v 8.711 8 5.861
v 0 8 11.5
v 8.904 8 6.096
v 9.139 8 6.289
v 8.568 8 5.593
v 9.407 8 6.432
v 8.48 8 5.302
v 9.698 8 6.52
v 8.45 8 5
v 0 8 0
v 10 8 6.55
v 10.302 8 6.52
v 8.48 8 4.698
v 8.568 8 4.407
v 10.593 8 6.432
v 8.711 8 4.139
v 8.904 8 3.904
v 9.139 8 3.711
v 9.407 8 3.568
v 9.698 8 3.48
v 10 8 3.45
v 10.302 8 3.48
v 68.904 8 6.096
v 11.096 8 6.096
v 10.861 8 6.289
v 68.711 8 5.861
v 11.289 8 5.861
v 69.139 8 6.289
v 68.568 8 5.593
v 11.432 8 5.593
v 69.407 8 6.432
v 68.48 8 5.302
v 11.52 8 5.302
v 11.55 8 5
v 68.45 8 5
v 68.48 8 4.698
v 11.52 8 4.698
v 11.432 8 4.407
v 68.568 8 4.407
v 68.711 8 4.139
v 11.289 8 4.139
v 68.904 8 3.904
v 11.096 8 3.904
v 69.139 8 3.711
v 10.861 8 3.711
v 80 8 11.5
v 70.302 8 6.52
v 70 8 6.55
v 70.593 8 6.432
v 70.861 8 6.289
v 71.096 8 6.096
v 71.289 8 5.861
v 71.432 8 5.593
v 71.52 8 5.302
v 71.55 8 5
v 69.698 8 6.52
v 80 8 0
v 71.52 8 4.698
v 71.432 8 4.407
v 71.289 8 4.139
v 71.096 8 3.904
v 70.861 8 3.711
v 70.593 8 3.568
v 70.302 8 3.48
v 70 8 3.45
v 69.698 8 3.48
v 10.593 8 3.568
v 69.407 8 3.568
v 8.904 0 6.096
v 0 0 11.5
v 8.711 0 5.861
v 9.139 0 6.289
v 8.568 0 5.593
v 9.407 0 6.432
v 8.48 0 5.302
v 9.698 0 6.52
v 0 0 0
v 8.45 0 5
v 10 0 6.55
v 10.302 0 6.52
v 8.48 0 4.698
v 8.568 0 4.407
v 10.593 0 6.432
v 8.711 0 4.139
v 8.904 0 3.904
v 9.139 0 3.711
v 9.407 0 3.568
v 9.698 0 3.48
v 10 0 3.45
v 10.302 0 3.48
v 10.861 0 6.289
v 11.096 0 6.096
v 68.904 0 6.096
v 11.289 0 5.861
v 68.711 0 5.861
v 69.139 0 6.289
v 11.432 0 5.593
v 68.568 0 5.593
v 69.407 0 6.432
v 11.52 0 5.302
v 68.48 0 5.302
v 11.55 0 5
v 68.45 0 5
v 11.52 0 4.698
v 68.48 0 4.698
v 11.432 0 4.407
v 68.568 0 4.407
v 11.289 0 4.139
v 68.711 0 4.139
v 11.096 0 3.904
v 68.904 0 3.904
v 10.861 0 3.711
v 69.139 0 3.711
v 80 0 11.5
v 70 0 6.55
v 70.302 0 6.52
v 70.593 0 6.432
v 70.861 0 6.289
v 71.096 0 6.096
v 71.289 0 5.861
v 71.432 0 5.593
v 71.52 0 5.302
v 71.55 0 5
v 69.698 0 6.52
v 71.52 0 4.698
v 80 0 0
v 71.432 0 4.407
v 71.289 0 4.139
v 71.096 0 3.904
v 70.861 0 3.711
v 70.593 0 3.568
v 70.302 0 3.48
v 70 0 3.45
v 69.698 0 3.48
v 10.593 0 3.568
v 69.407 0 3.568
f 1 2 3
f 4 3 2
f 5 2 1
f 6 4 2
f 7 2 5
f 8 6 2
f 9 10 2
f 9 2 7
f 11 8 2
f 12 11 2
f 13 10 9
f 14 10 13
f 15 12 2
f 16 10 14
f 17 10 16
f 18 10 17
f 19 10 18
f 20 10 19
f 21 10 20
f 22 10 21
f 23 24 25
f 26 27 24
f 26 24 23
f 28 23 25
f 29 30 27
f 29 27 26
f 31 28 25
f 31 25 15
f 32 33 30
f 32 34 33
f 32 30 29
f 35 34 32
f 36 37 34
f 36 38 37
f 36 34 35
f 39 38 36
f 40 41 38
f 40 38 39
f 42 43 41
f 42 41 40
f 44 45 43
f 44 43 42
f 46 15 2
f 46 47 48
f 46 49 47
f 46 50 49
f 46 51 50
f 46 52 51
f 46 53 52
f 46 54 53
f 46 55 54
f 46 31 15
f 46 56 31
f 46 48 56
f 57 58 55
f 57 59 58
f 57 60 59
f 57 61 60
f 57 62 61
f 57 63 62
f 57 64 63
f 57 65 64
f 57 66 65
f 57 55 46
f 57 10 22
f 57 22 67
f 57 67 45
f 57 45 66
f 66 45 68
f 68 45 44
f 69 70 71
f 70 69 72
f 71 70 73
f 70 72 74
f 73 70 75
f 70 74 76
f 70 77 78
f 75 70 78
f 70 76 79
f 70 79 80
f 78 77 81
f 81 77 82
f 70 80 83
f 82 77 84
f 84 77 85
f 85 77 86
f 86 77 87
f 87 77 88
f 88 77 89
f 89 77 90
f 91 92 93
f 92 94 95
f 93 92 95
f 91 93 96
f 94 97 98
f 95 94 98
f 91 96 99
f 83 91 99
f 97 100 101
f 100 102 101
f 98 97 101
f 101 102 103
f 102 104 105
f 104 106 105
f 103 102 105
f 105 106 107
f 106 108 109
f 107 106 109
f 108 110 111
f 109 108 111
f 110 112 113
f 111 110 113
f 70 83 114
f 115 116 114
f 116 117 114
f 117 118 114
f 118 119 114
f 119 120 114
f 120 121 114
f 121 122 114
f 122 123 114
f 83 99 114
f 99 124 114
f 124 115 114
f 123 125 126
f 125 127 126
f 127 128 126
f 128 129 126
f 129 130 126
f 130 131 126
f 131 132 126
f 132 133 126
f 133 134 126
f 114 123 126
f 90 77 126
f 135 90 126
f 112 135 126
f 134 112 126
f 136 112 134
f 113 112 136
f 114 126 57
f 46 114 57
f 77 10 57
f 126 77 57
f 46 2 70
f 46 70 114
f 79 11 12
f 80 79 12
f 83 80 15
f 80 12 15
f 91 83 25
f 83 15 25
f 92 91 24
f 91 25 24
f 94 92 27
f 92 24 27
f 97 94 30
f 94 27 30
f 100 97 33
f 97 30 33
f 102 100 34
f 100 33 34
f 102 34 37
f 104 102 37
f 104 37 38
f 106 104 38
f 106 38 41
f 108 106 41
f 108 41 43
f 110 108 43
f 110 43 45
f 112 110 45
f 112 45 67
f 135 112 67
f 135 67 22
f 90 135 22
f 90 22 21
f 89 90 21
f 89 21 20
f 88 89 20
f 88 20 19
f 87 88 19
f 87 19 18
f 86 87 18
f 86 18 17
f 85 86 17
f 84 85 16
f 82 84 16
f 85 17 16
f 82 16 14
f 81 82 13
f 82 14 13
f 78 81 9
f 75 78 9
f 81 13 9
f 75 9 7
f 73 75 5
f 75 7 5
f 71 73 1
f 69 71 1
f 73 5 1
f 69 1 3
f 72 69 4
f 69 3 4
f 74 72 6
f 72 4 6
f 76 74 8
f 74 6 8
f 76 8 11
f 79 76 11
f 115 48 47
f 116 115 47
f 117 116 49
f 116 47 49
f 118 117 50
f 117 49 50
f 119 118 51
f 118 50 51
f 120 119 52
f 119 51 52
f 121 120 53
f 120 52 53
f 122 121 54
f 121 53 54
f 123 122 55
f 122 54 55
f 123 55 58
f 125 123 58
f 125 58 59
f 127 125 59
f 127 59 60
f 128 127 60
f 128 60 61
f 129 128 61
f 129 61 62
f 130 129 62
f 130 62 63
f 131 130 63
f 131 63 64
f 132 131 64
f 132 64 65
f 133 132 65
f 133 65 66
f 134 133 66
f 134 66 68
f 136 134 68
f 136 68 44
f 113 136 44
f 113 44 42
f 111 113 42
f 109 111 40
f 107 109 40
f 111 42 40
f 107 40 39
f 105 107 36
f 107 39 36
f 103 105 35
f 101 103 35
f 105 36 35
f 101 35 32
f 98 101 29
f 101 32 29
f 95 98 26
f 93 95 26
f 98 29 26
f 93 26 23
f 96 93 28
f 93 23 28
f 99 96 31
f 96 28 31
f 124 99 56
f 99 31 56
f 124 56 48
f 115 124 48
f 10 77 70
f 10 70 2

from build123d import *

# Parameters (mm, degrees)
SKETCH_1_W          = 80
SKETCH_1_H          = 8
EXTRUDE_1_DEPTH     = 11.5
CUT_EXTRUDE_1_REACH = 83.217
SKETCH_2_R          = 1.55


with BuildPart() as part:
    # 草图1 → 凸台-拉伸1 (new body)
    with BuildSketch(Plane.XY):
        with Locations((40, 4)):
            Rectangle(SKETCH_1_W, SKETCH_1_H)
    extrude(amount=EXTRUDE_1_DEPTH)

    # 草图2 → 切除-拉伸1 (cut, up to next)
    with BuildSketch(Plane(origin=(0, 8, 0), x_dir=(1, 0, 0), z_dir=(0, 1, 0)), mode=Mode.PRIVATE) as cut_extrude_1_sk1:
        with Locations(Location((10, -5, 0), (0, 0, 270))):
            Circle(SKETCH_2_R)
    cut_extrude_1_tool1 = extrude(cut_extrude_1_sk1.sketch, amount=-CUT_EXTRUDE_1_REACH, mode=Mode.PRIVATE) & part.part
    # 草图2 → 切除-拉伸1 (cut, up to next)
    with BuildSketch(Plane(origin=(0, 8, 0), x_dir=(1, 0, 0), z_dir=(0, 1, 0)), mode=Mode.PRIVATE) as cut_extrude_1_sk2:
        with Locations(Location((70, -5, 0), (0, 0, 270))):
            Circle(SKETCH_2_R)
    cut_extrude_1_tool2 = extrude(cut_extrude_1_sk2.sketch, amount=-CUT_EXTRUDE_1_REACH, mode=Mode.PRIVATE) & part.part
    add(cut_extrude_1_tool1.solids().sort_by_distance((10, 8, 5))[0], mode=Mode.SUBTRACT)
    add(cut_extrude_1_tool2.solids().sort_by_distance((70, 8, 5))[0], mode=Mode.SUBTRACT)


solid = part.part
